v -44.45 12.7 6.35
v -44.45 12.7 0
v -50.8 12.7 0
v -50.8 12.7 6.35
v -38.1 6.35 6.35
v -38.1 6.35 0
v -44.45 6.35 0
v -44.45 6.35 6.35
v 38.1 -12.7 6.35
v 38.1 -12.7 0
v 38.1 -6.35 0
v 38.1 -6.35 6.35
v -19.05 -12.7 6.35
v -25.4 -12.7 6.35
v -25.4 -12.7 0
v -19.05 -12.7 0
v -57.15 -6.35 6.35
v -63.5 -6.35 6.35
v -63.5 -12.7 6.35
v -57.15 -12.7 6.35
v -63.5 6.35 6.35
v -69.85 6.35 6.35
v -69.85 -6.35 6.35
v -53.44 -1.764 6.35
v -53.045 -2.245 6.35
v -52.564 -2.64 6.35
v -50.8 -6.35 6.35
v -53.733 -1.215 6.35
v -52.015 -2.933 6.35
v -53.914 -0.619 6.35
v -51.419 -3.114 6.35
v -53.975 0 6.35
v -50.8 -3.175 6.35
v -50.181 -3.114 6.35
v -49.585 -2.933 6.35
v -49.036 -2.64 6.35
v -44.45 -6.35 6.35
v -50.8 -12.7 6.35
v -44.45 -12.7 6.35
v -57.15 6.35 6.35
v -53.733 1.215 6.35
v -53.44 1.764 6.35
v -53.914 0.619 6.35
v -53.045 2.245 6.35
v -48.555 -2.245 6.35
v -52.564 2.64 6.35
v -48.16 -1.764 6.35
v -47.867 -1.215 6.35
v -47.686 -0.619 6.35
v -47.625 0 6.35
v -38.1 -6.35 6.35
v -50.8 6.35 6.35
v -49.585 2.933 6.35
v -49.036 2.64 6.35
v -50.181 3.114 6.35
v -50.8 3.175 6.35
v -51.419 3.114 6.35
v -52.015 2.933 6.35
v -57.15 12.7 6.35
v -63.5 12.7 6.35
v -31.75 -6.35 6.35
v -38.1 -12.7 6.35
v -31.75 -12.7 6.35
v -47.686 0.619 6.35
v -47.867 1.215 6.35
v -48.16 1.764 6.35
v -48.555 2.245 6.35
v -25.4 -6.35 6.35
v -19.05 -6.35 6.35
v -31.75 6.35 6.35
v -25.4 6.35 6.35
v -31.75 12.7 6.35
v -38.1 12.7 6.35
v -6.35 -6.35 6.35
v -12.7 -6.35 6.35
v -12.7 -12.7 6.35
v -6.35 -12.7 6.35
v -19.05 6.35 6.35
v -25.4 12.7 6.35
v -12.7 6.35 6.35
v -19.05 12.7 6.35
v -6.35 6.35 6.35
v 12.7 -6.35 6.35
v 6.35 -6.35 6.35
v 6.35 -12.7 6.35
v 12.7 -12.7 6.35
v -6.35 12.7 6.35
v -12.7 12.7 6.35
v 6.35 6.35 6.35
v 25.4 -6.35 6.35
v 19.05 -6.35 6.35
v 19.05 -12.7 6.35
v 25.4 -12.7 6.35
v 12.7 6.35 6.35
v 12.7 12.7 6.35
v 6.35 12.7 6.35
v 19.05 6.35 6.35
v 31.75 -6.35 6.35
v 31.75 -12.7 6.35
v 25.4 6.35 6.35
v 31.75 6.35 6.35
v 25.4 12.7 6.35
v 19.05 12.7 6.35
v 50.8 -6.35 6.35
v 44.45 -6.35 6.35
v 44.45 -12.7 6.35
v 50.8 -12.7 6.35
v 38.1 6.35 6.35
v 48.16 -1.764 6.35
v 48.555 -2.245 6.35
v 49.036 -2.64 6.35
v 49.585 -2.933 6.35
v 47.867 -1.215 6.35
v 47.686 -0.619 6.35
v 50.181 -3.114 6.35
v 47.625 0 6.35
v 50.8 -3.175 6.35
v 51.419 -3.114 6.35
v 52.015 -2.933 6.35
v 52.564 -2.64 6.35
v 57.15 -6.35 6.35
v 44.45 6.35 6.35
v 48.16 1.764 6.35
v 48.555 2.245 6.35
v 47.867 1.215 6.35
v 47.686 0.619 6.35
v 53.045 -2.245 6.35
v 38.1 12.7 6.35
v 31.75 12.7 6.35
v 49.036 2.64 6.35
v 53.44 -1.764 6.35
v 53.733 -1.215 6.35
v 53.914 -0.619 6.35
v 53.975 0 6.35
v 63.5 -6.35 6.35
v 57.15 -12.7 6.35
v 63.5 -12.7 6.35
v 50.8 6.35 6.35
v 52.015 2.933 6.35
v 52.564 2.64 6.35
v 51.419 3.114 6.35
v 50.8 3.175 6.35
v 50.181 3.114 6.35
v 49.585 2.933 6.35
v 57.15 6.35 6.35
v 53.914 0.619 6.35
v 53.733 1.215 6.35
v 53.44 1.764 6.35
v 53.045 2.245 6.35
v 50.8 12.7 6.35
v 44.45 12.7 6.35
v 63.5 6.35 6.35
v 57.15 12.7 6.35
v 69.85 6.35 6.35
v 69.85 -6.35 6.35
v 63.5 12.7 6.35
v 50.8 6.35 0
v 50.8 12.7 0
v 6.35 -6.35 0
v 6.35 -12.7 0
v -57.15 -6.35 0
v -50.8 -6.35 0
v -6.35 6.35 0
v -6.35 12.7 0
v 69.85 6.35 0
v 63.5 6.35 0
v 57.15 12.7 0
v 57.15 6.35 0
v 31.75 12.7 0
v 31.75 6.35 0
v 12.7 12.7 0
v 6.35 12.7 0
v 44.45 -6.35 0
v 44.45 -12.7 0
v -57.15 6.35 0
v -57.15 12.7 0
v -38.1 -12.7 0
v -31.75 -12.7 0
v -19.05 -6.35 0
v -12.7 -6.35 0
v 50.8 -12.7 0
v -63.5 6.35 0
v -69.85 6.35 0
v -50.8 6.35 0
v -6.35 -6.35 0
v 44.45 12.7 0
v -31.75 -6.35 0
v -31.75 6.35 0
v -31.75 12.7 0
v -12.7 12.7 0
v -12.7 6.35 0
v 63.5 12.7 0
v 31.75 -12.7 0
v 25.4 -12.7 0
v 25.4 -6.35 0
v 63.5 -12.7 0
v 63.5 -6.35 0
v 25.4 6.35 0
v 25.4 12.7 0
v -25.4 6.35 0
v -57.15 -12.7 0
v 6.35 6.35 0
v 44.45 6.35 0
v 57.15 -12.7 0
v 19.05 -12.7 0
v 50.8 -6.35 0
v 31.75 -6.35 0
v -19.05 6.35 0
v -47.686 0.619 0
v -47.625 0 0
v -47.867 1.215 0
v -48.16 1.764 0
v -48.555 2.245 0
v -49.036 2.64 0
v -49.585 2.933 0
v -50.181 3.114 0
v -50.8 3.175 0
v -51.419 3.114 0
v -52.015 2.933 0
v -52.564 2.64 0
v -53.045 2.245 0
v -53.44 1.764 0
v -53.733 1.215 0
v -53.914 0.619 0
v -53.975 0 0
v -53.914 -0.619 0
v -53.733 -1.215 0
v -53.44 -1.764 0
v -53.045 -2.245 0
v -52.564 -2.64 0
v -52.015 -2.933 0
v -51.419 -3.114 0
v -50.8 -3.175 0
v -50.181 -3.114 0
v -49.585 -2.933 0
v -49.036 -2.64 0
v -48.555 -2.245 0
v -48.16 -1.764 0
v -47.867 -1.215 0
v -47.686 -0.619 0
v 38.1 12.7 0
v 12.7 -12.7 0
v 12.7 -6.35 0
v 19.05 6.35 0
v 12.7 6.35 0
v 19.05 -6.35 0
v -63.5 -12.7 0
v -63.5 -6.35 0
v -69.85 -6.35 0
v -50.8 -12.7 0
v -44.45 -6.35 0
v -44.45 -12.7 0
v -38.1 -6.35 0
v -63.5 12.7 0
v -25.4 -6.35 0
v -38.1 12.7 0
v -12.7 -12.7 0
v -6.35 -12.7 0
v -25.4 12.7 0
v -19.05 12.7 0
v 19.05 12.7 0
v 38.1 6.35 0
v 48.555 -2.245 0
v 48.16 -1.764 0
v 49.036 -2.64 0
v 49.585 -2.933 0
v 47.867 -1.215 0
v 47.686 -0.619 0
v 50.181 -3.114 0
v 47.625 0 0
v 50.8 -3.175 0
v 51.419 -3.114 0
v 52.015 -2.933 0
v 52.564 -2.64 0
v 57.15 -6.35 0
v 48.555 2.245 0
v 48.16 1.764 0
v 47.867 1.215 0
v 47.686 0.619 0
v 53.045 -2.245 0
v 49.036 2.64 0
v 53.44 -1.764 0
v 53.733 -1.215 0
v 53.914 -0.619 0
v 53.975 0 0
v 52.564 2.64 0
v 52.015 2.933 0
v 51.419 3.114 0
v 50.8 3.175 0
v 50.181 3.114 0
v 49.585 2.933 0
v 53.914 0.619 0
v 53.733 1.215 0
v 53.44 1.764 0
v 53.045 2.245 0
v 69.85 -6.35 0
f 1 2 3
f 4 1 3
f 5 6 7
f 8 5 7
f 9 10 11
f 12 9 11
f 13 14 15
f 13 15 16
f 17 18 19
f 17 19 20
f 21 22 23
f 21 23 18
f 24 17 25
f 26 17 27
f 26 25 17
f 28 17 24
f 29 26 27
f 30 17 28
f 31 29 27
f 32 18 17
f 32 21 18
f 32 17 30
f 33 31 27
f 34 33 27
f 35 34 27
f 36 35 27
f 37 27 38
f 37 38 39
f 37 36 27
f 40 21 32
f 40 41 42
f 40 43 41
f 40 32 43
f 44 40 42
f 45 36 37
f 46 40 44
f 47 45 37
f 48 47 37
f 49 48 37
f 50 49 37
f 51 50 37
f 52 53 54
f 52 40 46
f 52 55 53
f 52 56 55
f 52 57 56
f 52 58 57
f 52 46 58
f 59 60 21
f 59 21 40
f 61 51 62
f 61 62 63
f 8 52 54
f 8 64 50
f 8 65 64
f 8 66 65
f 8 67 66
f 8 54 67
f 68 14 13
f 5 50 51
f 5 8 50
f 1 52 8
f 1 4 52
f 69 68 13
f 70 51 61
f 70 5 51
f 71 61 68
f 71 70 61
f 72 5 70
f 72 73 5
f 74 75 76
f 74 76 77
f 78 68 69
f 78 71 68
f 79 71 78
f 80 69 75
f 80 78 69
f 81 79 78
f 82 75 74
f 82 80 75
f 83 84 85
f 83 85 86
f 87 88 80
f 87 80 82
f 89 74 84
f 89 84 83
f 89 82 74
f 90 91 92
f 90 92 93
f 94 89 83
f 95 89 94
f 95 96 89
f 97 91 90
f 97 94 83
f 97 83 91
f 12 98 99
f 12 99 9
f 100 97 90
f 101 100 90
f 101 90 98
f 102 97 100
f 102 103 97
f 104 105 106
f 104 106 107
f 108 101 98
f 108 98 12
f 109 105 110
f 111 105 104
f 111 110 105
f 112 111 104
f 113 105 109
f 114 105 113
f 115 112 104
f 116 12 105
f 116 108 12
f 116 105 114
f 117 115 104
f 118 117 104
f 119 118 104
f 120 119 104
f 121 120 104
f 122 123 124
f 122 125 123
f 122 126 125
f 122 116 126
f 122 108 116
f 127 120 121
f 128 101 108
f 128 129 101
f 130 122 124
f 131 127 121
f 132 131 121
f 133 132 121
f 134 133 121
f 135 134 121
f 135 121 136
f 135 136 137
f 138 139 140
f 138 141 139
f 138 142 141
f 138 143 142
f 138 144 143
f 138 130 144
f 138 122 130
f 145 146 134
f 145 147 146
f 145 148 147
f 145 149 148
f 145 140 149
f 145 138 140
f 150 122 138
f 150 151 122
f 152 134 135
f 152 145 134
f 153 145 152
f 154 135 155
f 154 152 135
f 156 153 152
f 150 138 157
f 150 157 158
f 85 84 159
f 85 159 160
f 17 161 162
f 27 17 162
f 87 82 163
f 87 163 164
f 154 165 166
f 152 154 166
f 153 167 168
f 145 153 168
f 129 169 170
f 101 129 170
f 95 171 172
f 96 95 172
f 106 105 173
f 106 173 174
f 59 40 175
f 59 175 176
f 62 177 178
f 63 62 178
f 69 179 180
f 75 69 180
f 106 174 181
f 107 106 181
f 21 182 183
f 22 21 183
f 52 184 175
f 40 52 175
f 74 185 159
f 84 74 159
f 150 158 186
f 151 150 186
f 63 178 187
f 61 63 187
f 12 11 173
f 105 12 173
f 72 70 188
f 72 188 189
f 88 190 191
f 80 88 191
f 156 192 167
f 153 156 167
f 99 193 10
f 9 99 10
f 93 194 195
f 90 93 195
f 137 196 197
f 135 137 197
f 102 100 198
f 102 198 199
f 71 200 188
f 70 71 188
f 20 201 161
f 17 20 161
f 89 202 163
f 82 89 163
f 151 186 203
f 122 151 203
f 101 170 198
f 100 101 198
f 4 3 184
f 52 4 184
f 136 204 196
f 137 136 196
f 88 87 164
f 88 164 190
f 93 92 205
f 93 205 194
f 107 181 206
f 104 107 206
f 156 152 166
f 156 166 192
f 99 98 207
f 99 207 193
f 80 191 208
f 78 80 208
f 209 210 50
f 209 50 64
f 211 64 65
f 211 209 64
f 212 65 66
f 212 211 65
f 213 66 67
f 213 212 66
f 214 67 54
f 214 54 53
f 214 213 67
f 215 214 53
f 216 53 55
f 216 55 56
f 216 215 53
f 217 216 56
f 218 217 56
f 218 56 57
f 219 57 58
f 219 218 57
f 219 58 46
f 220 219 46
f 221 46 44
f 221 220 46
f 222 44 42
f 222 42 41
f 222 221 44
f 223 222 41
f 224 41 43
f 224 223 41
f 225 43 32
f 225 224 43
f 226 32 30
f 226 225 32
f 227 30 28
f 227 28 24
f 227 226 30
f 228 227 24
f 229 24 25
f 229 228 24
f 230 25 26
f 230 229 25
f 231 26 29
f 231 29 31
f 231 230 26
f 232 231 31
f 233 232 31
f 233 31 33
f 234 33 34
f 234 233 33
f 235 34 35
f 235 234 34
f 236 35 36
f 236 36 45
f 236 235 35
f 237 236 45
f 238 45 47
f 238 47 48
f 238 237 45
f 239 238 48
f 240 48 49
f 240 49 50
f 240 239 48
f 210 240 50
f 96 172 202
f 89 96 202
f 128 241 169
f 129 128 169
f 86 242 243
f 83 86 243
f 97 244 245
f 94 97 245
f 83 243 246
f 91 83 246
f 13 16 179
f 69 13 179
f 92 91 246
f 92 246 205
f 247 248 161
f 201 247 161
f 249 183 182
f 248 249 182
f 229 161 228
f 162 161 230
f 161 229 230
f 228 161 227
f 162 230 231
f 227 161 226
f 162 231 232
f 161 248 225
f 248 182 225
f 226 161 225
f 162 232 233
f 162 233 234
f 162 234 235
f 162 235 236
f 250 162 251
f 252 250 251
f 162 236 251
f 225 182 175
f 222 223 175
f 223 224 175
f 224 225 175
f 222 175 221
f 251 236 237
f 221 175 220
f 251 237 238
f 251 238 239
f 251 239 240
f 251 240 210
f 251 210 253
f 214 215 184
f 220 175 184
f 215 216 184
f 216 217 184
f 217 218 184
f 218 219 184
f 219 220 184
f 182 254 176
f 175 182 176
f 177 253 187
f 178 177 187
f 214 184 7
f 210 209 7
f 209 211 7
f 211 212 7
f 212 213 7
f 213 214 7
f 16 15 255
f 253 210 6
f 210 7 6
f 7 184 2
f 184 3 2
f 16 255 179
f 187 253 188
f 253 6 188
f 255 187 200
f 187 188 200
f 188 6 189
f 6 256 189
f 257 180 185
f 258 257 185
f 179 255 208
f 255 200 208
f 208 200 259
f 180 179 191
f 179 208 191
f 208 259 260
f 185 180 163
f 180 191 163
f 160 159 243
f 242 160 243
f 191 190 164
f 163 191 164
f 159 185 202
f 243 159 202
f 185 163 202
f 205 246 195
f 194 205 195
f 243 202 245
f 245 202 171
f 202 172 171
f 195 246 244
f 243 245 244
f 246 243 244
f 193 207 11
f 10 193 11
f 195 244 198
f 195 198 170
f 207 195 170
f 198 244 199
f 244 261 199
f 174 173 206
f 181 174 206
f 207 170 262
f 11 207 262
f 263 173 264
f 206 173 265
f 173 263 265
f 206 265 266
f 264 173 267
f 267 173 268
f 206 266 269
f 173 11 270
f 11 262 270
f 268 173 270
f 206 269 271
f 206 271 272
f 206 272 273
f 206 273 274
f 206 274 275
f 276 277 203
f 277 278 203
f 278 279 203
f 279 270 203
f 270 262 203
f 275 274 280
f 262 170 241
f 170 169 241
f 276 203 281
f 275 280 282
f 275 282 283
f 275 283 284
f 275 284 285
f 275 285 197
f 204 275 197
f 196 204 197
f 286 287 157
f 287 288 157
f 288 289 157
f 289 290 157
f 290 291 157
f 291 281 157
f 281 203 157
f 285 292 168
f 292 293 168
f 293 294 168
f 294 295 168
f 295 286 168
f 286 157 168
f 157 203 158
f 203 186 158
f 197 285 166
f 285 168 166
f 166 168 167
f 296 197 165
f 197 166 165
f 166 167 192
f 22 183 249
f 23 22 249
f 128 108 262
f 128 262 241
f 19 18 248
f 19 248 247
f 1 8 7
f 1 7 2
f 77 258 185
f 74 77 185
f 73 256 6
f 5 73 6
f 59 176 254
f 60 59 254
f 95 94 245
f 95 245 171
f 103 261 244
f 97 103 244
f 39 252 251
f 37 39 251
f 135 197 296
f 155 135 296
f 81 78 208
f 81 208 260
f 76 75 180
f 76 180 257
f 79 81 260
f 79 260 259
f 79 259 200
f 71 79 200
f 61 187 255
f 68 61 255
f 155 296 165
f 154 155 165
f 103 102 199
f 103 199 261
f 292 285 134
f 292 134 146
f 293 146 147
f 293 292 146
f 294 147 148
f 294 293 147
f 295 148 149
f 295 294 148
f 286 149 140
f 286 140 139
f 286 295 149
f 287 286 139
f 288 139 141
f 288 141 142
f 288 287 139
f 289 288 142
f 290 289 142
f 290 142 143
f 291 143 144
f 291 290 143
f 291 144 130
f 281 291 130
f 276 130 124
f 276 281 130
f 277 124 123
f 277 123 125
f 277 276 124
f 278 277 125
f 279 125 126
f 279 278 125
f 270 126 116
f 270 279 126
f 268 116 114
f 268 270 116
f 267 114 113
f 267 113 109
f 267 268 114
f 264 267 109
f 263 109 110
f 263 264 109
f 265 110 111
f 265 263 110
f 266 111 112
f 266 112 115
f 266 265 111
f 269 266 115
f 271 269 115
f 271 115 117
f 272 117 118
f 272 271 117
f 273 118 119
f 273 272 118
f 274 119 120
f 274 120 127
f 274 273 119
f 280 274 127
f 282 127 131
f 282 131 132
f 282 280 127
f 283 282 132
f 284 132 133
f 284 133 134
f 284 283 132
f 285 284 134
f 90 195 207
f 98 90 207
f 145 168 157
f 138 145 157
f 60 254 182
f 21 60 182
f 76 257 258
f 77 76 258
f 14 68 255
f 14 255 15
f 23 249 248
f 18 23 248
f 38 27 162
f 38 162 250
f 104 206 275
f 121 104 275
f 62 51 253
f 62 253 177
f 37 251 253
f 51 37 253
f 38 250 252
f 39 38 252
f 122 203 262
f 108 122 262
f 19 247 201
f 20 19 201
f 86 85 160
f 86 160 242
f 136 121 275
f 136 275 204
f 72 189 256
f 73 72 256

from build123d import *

# Parameters (mm, degrees)
SKETCH1_R           = 3.175
BOSS_EXTRUDE1_DEPTH = 6.35


with BuildPart() as part:
    # Sketch1 → Boss-Extrude1 (new body)
    with BuildSketch(Plane.XY):
        Polygon((-57.15, 12.7), (-63.5, 12.7), (-63.5, 6.35), (-69.85, 6.35), (-69.85, -6.35), (-63.5, -6.35), (-63.5, -12.7), (-57.15, -12.7), (-57.15, -6.35), (-50.8, -6.35), (-50.8, -12.7), (-44.45, -12.7), (-44.45, -6.35), (-38.1, -6.35), (-38.1, -12.7), (-31.75, -12.7), (-31.75, -6.35), (-25.4, -6.35), (-25.4, -12.7), (-19.05, -12.7), (-19.05, -6.35), (-12.7, -6.35), (-12.7, -12.7), (-6.35, -12.7), (-6.35, -6.35), (0, -6.35), (6.35, -6.35), (6.35, -12.7), (12.7, -12.7), (12.7, -6.35), (19.05, -6.35), (19.05, -12.7), (25.4, -12.7), (25.4, -6.35), (31.75, -6.35), (31.75, -12.7), (38.1, -12.7), (38.1, -6.35), (44.45, -6.35), (44.45, -12.7), (50.8, -12.7), (50.8, -6.35), (57.15, -6.35), (57.15, -12.7), (63.5, -12.7), (63.5, -6.35), (69.85, -6.35), (69.85, 6.35), (63.5, 6.35), (63.5, 12.7), (57.15, 12.7), (57.15, 6.35), (50.8, 6.35), (50.8, 12.7), (44.45, 12.7), (44.45, 6.35), (38.1, 6.35), (38.1, 12.7), (31.75, 12.7), (31.75, 6.35), (25.4, 6.35), (25.4, 12.7), (19.05, 12.7), (19.05, 6.35), (12.7, 6.35), (12.7, 12.7), (6.35, 12.7), (6.35, 6.35), (0, 6.35), (-6.35, 6.35), (-6.35, 12.7), (-12.7, 12.7), (-12.7, 6.35), (-19.05, 6.35), (-19.05, 12.7), (-25.4, 12.7), (-25.4, 6.35), (-31.75, 6.35), (-31.75, 12.7), (-38.1, 12.7), (-38.1, 6.35), (-44.45, 6.35), (-44.45, 12.7), (-50.8, 12.7), (-50.8, 6.35), (-57.15, 6.35), align=None)
        with Locations((-50.8, 0)):
            Circle(SKETCH1_R, mode=Mode.SUBTRACT)
        with Locations((50.8, 0)):
            Circle(SKETCH1_R, mode=Mode.SUBTRACT)
    extrude(amount=BOSS_EXTRUDE1_DEPTH)


solid = part.part
